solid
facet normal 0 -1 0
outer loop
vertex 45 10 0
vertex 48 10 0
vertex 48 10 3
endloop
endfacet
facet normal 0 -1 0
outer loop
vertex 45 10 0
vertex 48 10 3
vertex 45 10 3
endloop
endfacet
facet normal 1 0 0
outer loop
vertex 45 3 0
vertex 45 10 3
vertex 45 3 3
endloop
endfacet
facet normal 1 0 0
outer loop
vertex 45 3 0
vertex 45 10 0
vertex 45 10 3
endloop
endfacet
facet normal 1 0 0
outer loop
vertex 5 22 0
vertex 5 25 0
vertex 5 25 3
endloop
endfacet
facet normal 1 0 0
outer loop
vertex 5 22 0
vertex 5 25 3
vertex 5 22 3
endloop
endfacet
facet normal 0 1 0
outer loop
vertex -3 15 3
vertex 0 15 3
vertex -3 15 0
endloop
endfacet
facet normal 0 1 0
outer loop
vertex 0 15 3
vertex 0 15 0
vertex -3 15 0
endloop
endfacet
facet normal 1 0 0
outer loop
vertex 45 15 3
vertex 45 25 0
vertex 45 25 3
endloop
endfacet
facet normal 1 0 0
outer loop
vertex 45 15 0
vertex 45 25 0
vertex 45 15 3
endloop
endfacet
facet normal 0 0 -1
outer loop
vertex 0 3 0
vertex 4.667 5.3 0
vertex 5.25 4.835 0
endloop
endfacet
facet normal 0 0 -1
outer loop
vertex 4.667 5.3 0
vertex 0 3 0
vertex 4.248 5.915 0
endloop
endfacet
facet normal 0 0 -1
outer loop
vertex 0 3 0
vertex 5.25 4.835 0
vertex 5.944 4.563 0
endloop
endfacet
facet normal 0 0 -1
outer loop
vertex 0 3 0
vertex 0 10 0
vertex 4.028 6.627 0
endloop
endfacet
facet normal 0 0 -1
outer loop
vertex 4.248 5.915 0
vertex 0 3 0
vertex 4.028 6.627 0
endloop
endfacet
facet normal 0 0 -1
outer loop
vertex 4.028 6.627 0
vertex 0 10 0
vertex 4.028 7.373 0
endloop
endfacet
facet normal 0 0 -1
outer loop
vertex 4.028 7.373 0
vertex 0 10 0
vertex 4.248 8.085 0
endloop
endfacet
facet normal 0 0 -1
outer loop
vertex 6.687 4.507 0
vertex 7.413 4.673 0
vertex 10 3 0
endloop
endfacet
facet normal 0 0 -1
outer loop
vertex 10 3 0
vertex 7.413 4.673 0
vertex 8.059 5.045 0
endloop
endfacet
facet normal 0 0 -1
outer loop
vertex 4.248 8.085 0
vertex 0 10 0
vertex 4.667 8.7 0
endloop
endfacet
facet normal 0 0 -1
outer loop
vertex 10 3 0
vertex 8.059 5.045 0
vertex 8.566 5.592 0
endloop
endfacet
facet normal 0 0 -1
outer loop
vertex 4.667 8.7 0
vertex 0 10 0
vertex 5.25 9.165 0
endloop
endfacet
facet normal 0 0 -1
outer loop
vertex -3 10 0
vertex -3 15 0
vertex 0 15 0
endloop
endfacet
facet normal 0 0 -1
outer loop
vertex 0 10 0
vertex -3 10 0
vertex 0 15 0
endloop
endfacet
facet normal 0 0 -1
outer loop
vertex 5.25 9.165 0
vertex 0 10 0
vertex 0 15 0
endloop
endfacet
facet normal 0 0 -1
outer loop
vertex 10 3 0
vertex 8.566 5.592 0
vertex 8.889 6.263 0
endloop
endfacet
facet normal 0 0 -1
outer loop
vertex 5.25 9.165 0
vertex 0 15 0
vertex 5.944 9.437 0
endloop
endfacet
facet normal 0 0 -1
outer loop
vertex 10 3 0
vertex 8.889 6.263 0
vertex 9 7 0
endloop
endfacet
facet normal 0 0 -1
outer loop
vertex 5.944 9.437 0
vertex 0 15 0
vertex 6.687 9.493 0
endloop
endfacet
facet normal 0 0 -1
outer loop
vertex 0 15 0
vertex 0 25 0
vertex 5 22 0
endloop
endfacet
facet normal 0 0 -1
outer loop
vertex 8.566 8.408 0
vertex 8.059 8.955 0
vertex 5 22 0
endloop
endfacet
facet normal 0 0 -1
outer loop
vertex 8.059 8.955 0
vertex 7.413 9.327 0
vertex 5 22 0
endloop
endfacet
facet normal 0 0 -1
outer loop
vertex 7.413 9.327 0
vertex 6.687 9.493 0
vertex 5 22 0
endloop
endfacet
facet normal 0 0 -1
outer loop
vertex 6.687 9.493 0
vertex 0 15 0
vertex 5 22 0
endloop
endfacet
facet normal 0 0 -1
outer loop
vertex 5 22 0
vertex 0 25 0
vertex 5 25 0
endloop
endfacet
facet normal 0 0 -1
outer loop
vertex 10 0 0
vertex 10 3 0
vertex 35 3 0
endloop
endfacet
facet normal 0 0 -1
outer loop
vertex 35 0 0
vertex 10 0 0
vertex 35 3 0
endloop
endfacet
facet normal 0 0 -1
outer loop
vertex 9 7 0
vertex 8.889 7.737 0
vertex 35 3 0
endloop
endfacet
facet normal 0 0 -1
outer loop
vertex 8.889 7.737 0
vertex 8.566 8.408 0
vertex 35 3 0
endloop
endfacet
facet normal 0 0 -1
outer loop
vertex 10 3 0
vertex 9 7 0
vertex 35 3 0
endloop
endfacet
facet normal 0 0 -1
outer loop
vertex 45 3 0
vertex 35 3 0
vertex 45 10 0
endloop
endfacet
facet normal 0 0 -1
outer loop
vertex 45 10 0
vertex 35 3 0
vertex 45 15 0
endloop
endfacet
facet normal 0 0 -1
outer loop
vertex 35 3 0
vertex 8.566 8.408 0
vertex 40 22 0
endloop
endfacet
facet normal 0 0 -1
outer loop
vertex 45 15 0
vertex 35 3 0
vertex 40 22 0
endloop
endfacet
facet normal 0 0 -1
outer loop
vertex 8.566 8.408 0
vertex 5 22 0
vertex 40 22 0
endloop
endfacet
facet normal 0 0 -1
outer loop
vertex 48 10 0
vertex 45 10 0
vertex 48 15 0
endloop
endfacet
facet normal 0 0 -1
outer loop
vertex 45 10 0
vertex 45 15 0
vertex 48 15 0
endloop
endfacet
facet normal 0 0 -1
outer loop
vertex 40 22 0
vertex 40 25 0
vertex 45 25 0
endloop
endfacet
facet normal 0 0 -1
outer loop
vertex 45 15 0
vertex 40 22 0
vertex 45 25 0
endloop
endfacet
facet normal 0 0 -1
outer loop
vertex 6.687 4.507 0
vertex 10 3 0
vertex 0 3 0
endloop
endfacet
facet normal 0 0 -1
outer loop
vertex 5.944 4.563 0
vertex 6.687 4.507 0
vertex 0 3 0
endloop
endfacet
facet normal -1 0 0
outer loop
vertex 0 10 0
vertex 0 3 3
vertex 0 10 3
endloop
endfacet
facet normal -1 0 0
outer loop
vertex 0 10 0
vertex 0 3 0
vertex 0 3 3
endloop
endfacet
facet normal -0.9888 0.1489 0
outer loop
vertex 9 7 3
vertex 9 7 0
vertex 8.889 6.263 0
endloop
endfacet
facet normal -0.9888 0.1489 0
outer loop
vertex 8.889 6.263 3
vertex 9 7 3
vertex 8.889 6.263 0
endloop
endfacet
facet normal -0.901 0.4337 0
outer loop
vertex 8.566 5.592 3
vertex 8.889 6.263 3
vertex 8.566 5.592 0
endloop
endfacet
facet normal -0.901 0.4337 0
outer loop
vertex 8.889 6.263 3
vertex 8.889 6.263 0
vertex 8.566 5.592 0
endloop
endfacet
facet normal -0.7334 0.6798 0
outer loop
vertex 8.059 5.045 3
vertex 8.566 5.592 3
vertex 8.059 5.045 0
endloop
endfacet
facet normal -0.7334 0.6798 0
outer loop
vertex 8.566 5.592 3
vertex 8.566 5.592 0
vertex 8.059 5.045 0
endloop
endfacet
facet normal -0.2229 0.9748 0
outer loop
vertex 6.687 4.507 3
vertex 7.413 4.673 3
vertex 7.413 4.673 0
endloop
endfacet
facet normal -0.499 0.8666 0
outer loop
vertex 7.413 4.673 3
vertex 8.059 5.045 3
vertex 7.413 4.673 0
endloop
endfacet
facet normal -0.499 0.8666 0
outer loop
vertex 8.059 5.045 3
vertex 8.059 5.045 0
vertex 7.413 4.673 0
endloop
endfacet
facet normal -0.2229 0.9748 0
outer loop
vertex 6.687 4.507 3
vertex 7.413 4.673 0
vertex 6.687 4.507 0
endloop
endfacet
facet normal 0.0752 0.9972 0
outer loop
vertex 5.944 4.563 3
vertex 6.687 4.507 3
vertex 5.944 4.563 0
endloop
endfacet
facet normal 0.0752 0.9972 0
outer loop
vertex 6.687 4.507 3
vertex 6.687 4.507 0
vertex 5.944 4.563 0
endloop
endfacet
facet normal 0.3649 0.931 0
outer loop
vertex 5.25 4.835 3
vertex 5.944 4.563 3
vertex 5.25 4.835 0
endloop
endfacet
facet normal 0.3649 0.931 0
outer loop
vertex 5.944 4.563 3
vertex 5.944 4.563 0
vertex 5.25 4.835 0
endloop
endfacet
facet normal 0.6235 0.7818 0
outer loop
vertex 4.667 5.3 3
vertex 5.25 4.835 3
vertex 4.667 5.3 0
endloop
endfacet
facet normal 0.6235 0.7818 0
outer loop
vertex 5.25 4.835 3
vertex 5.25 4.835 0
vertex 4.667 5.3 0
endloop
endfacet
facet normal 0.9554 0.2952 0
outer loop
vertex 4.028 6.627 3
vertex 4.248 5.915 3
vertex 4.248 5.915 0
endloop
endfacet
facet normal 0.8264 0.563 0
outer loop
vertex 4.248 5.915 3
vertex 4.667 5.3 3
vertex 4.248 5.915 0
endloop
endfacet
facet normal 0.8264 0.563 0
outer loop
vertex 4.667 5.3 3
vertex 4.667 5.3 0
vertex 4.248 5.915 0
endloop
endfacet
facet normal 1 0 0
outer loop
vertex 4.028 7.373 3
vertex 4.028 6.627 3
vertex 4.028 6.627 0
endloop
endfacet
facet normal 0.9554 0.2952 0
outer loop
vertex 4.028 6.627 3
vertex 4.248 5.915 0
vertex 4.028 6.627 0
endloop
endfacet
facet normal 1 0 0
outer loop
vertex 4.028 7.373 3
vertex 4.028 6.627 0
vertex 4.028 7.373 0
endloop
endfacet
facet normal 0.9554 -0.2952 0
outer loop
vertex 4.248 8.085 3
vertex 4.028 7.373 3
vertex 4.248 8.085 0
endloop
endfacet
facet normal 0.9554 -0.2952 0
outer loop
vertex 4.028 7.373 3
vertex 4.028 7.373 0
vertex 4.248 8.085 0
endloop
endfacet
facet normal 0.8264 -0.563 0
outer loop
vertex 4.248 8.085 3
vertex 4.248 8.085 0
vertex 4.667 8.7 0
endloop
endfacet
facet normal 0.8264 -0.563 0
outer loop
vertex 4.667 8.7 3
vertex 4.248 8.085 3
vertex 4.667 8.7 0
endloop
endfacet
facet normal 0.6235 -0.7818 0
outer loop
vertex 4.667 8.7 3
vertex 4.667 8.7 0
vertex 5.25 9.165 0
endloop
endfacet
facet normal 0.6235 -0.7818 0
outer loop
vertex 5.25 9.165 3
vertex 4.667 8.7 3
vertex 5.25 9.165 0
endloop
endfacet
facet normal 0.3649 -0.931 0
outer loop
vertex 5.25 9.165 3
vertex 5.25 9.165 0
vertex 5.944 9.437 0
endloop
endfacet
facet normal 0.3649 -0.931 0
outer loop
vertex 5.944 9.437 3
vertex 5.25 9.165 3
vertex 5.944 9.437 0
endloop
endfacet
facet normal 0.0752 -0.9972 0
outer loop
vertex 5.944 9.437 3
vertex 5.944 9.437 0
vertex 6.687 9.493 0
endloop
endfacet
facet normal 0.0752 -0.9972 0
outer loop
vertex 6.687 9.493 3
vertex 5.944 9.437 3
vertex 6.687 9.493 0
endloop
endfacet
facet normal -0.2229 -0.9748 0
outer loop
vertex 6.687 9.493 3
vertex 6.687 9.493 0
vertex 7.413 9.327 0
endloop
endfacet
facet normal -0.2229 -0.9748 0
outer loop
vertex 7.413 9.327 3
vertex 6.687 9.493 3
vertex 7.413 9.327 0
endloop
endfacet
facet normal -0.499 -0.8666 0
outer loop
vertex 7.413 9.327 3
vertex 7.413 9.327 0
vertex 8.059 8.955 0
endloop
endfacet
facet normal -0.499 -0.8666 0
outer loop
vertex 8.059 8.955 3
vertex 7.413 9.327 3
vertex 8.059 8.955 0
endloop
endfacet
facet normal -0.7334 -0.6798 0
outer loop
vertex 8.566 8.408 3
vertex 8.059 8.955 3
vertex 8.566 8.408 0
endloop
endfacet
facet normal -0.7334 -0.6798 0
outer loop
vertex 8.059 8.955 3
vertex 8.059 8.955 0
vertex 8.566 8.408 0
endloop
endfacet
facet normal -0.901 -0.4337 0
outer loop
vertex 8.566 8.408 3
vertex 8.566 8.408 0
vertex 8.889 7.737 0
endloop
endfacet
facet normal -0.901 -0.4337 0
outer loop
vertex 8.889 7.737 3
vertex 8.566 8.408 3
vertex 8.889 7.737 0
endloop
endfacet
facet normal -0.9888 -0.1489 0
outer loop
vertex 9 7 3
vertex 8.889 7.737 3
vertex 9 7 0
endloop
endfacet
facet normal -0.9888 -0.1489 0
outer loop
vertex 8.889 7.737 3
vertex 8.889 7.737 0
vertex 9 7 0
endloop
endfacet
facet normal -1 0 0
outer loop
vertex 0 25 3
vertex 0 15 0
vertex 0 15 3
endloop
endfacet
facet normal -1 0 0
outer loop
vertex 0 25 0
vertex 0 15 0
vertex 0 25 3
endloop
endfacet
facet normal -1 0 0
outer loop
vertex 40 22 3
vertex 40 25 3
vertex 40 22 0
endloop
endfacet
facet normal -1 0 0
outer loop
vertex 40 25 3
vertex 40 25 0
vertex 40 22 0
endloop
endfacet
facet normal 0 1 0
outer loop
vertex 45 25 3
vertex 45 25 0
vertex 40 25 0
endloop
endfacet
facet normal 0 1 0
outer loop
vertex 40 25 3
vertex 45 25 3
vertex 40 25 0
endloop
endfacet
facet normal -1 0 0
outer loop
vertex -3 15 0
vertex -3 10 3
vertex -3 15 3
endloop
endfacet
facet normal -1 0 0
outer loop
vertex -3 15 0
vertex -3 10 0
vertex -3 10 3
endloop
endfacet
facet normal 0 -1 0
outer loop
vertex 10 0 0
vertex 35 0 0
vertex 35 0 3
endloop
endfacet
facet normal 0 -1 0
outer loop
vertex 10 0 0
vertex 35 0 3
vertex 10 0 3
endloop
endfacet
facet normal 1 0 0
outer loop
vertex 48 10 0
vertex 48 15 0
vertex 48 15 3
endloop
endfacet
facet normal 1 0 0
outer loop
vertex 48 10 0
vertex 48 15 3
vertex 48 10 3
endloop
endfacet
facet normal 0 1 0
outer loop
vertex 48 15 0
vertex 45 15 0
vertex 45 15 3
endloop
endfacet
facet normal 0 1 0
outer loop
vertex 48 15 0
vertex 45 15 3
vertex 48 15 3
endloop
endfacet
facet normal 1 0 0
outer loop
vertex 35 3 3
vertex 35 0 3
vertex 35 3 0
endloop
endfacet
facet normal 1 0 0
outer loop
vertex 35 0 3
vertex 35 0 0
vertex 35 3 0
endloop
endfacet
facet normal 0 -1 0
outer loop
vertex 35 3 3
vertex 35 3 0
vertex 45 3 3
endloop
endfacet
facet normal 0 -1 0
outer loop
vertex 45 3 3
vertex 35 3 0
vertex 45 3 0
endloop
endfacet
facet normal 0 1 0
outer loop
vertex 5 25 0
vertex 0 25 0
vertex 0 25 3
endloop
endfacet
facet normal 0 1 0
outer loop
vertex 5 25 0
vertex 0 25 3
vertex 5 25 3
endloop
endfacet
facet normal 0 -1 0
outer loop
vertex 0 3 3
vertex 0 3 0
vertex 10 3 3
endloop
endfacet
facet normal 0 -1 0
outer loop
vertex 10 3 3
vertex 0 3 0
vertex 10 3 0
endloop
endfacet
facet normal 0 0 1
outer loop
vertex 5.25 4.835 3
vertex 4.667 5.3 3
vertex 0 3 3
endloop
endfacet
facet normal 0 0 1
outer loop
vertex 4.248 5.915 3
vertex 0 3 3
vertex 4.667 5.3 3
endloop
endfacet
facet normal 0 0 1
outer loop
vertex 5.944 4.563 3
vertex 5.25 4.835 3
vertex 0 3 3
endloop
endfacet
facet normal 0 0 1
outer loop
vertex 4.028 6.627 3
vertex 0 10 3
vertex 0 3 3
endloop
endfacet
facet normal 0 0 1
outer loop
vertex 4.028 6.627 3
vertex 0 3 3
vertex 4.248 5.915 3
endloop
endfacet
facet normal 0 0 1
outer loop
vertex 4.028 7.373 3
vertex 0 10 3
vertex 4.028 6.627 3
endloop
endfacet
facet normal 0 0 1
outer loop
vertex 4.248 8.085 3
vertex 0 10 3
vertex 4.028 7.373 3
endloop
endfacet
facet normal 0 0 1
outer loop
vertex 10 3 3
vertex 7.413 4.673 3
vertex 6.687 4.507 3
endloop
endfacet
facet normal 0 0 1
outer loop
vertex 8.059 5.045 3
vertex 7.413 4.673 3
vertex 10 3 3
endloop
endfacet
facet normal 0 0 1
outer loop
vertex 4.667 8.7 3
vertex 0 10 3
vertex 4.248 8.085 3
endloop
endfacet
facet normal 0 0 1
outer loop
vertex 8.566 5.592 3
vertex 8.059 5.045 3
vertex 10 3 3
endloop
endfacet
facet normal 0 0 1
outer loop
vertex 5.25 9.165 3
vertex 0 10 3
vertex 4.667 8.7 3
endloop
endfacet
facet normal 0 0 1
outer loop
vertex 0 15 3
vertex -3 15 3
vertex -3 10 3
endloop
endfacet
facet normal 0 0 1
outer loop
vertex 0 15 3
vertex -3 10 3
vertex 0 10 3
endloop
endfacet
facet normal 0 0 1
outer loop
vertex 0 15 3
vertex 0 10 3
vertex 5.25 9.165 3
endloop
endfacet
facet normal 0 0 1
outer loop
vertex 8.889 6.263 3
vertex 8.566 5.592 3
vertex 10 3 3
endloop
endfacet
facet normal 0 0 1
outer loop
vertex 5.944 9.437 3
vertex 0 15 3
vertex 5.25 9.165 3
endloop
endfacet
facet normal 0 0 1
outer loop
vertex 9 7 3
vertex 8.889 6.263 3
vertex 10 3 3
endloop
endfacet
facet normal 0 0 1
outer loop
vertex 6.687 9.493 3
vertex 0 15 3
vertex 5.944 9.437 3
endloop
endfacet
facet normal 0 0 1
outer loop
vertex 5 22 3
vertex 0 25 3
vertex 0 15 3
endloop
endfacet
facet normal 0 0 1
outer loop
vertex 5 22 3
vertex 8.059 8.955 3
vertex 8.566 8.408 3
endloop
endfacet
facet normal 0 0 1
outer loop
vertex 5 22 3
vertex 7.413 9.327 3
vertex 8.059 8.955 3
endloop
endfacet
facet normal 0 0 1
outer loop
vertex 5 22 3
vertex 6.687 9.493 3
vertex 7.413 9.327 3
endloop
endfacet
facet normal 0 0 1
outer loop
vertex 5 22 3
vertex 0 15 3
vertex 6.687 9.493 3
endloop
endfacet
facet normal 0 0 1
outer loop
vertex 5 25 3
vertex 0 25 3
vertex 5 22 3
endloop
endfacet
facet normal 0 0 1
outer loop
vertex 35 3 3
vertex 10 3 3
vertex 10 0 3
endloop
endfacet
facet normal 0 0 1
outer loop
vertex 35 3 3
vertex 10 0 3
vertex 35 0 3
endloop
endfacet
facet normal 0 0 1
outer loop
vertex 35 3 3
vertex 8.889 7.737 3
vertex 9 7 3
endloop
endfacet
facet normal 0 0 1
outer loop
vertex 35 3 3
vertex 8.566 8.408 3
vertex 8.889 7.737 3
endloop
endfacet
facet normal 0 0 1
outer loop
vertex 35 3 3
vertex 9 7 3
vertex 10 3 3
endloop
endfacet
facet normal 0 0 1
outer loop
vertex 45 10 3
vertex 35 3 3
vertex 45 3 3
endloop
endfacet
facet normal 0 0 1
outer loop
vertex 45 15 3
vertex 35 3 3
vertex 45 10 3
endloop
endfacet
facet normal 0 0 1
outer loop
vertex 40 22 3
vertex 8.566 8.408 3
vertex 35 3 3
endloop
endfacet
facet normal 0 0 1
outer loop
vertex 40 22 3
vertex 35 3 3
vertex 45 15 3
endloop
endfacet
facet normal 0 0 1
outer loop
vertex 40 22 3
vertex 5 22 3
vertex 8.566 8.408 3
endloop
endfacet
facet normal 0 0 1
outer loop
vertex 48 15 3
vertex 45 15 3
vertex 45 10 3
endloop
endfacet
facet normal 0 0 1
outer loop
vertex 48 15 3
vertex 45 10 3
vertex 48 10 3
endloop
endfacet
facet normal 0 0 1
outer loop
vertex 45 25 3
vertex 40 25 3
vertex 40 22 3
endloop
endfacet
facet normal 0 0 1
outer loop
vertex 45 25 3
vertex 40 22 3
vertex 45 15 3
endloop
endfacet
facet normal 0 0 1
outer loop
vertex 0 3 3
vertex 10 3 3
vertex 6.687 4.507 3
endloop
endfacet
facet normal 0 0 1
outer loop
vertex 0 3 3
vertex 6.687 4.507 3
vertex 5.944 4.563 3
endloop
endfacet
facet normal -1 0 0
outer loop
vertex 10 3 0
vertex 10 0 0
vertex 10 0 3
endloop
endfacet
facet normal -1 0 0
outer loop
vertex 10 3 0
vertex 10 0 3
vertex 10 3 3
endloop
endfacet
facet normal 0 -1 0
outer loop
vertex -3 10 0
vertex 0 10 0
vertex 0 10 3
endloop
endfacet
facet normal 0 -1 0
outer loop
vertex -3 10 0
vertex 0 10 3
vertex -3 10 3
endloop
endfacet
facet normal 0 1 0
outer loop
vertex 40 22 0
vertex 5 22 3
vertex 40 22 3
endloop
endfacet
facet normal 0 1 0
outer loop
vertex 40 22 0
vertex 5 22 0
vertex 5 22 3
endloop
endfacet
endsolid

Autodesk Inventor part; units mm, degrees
ref_plane "YZ Plane" through (0, 0, 0) normal (1, 0, 0) x (0, 1, 0)
ref_plane "XZ Plane" through (0, 0, 0) normal (0, 1, 0) x (-1, 0, 0)
ref_plane "XY Plane" through (0, 0, 0) normal (0, 0, 1) x (1, 0, 0)
sketch "Sketch1" plane through (0, 0, 0) normal (0, 0, 1) x (1, 0, 0)
  line L0 (10, 3) -> (35, 3) projected
  line L1 (10, 0) -> (10, 3) projected
  line L2 (35, 0) -> (10, 0) projected
  line L3 (35, 0) -> (35, 3) projected
  line L4 (0, 3) -> (10, 3) projected
  line L5 (-3, 10) -> (-3, 15) projected
  line L6 (0, 15) -> (-3, 15) projected
  line L7 (0, 15) -> (0, 25) projected
  line L8 (35, 3) -> (45, 3) projected
  line L9 (45, 10) -> (45, 0) projected
  line L10 (48, 10) -> (45, 10) projected
  line L11 (48, 15) -> (48, 10) projected
  line L12 (45, 15) -> (48, 15) projected
  line L13 (45, 25) -> (45, 15) projected
  line L14 (0, 25) -> (5, 25)
  line L15 (5, 25) -> (5, 22)
  line L16 (5, 22) -> (0, 22)
  line L17 (0, 22) -> (0, 25)
  line L18 (45, 25) -> (40, 25)
  line L19 (40, 25) -> (40, 22)
  line L20 (40, 22) -> (45, 22)
  line L21 (45, 22) -> (45, 25)
  line L22 (5, 22) -> (40, 22)
  circle A0 centre (6.5, 7) radius 4 projected
  circle A1 centre (6.5, 7) radius 2.5
  line L23 (0, 10) -> (-3, 10) projected
  line L24 (0, 0) -> (0, 10) projected
  dimension "d0" = 5
  dimension "d1" = 3
  dimension "d2" = 5
  dimension "d3" = 3
  dimension "d4" = 5
extrude "Extrusion1" add sketch "Sketch1" along normal blind 3 contours A0 | L4 L24 L23 L5 L6 L7 L16 L22 L20 L13 L12 L11 L10 L9 L8 L0 | L0 L3 L2 L1 | L20 L19 L18 L13 | L7 L14 L15 L16
properties part number "SideTopNM" material "Acrylic, Clear"
